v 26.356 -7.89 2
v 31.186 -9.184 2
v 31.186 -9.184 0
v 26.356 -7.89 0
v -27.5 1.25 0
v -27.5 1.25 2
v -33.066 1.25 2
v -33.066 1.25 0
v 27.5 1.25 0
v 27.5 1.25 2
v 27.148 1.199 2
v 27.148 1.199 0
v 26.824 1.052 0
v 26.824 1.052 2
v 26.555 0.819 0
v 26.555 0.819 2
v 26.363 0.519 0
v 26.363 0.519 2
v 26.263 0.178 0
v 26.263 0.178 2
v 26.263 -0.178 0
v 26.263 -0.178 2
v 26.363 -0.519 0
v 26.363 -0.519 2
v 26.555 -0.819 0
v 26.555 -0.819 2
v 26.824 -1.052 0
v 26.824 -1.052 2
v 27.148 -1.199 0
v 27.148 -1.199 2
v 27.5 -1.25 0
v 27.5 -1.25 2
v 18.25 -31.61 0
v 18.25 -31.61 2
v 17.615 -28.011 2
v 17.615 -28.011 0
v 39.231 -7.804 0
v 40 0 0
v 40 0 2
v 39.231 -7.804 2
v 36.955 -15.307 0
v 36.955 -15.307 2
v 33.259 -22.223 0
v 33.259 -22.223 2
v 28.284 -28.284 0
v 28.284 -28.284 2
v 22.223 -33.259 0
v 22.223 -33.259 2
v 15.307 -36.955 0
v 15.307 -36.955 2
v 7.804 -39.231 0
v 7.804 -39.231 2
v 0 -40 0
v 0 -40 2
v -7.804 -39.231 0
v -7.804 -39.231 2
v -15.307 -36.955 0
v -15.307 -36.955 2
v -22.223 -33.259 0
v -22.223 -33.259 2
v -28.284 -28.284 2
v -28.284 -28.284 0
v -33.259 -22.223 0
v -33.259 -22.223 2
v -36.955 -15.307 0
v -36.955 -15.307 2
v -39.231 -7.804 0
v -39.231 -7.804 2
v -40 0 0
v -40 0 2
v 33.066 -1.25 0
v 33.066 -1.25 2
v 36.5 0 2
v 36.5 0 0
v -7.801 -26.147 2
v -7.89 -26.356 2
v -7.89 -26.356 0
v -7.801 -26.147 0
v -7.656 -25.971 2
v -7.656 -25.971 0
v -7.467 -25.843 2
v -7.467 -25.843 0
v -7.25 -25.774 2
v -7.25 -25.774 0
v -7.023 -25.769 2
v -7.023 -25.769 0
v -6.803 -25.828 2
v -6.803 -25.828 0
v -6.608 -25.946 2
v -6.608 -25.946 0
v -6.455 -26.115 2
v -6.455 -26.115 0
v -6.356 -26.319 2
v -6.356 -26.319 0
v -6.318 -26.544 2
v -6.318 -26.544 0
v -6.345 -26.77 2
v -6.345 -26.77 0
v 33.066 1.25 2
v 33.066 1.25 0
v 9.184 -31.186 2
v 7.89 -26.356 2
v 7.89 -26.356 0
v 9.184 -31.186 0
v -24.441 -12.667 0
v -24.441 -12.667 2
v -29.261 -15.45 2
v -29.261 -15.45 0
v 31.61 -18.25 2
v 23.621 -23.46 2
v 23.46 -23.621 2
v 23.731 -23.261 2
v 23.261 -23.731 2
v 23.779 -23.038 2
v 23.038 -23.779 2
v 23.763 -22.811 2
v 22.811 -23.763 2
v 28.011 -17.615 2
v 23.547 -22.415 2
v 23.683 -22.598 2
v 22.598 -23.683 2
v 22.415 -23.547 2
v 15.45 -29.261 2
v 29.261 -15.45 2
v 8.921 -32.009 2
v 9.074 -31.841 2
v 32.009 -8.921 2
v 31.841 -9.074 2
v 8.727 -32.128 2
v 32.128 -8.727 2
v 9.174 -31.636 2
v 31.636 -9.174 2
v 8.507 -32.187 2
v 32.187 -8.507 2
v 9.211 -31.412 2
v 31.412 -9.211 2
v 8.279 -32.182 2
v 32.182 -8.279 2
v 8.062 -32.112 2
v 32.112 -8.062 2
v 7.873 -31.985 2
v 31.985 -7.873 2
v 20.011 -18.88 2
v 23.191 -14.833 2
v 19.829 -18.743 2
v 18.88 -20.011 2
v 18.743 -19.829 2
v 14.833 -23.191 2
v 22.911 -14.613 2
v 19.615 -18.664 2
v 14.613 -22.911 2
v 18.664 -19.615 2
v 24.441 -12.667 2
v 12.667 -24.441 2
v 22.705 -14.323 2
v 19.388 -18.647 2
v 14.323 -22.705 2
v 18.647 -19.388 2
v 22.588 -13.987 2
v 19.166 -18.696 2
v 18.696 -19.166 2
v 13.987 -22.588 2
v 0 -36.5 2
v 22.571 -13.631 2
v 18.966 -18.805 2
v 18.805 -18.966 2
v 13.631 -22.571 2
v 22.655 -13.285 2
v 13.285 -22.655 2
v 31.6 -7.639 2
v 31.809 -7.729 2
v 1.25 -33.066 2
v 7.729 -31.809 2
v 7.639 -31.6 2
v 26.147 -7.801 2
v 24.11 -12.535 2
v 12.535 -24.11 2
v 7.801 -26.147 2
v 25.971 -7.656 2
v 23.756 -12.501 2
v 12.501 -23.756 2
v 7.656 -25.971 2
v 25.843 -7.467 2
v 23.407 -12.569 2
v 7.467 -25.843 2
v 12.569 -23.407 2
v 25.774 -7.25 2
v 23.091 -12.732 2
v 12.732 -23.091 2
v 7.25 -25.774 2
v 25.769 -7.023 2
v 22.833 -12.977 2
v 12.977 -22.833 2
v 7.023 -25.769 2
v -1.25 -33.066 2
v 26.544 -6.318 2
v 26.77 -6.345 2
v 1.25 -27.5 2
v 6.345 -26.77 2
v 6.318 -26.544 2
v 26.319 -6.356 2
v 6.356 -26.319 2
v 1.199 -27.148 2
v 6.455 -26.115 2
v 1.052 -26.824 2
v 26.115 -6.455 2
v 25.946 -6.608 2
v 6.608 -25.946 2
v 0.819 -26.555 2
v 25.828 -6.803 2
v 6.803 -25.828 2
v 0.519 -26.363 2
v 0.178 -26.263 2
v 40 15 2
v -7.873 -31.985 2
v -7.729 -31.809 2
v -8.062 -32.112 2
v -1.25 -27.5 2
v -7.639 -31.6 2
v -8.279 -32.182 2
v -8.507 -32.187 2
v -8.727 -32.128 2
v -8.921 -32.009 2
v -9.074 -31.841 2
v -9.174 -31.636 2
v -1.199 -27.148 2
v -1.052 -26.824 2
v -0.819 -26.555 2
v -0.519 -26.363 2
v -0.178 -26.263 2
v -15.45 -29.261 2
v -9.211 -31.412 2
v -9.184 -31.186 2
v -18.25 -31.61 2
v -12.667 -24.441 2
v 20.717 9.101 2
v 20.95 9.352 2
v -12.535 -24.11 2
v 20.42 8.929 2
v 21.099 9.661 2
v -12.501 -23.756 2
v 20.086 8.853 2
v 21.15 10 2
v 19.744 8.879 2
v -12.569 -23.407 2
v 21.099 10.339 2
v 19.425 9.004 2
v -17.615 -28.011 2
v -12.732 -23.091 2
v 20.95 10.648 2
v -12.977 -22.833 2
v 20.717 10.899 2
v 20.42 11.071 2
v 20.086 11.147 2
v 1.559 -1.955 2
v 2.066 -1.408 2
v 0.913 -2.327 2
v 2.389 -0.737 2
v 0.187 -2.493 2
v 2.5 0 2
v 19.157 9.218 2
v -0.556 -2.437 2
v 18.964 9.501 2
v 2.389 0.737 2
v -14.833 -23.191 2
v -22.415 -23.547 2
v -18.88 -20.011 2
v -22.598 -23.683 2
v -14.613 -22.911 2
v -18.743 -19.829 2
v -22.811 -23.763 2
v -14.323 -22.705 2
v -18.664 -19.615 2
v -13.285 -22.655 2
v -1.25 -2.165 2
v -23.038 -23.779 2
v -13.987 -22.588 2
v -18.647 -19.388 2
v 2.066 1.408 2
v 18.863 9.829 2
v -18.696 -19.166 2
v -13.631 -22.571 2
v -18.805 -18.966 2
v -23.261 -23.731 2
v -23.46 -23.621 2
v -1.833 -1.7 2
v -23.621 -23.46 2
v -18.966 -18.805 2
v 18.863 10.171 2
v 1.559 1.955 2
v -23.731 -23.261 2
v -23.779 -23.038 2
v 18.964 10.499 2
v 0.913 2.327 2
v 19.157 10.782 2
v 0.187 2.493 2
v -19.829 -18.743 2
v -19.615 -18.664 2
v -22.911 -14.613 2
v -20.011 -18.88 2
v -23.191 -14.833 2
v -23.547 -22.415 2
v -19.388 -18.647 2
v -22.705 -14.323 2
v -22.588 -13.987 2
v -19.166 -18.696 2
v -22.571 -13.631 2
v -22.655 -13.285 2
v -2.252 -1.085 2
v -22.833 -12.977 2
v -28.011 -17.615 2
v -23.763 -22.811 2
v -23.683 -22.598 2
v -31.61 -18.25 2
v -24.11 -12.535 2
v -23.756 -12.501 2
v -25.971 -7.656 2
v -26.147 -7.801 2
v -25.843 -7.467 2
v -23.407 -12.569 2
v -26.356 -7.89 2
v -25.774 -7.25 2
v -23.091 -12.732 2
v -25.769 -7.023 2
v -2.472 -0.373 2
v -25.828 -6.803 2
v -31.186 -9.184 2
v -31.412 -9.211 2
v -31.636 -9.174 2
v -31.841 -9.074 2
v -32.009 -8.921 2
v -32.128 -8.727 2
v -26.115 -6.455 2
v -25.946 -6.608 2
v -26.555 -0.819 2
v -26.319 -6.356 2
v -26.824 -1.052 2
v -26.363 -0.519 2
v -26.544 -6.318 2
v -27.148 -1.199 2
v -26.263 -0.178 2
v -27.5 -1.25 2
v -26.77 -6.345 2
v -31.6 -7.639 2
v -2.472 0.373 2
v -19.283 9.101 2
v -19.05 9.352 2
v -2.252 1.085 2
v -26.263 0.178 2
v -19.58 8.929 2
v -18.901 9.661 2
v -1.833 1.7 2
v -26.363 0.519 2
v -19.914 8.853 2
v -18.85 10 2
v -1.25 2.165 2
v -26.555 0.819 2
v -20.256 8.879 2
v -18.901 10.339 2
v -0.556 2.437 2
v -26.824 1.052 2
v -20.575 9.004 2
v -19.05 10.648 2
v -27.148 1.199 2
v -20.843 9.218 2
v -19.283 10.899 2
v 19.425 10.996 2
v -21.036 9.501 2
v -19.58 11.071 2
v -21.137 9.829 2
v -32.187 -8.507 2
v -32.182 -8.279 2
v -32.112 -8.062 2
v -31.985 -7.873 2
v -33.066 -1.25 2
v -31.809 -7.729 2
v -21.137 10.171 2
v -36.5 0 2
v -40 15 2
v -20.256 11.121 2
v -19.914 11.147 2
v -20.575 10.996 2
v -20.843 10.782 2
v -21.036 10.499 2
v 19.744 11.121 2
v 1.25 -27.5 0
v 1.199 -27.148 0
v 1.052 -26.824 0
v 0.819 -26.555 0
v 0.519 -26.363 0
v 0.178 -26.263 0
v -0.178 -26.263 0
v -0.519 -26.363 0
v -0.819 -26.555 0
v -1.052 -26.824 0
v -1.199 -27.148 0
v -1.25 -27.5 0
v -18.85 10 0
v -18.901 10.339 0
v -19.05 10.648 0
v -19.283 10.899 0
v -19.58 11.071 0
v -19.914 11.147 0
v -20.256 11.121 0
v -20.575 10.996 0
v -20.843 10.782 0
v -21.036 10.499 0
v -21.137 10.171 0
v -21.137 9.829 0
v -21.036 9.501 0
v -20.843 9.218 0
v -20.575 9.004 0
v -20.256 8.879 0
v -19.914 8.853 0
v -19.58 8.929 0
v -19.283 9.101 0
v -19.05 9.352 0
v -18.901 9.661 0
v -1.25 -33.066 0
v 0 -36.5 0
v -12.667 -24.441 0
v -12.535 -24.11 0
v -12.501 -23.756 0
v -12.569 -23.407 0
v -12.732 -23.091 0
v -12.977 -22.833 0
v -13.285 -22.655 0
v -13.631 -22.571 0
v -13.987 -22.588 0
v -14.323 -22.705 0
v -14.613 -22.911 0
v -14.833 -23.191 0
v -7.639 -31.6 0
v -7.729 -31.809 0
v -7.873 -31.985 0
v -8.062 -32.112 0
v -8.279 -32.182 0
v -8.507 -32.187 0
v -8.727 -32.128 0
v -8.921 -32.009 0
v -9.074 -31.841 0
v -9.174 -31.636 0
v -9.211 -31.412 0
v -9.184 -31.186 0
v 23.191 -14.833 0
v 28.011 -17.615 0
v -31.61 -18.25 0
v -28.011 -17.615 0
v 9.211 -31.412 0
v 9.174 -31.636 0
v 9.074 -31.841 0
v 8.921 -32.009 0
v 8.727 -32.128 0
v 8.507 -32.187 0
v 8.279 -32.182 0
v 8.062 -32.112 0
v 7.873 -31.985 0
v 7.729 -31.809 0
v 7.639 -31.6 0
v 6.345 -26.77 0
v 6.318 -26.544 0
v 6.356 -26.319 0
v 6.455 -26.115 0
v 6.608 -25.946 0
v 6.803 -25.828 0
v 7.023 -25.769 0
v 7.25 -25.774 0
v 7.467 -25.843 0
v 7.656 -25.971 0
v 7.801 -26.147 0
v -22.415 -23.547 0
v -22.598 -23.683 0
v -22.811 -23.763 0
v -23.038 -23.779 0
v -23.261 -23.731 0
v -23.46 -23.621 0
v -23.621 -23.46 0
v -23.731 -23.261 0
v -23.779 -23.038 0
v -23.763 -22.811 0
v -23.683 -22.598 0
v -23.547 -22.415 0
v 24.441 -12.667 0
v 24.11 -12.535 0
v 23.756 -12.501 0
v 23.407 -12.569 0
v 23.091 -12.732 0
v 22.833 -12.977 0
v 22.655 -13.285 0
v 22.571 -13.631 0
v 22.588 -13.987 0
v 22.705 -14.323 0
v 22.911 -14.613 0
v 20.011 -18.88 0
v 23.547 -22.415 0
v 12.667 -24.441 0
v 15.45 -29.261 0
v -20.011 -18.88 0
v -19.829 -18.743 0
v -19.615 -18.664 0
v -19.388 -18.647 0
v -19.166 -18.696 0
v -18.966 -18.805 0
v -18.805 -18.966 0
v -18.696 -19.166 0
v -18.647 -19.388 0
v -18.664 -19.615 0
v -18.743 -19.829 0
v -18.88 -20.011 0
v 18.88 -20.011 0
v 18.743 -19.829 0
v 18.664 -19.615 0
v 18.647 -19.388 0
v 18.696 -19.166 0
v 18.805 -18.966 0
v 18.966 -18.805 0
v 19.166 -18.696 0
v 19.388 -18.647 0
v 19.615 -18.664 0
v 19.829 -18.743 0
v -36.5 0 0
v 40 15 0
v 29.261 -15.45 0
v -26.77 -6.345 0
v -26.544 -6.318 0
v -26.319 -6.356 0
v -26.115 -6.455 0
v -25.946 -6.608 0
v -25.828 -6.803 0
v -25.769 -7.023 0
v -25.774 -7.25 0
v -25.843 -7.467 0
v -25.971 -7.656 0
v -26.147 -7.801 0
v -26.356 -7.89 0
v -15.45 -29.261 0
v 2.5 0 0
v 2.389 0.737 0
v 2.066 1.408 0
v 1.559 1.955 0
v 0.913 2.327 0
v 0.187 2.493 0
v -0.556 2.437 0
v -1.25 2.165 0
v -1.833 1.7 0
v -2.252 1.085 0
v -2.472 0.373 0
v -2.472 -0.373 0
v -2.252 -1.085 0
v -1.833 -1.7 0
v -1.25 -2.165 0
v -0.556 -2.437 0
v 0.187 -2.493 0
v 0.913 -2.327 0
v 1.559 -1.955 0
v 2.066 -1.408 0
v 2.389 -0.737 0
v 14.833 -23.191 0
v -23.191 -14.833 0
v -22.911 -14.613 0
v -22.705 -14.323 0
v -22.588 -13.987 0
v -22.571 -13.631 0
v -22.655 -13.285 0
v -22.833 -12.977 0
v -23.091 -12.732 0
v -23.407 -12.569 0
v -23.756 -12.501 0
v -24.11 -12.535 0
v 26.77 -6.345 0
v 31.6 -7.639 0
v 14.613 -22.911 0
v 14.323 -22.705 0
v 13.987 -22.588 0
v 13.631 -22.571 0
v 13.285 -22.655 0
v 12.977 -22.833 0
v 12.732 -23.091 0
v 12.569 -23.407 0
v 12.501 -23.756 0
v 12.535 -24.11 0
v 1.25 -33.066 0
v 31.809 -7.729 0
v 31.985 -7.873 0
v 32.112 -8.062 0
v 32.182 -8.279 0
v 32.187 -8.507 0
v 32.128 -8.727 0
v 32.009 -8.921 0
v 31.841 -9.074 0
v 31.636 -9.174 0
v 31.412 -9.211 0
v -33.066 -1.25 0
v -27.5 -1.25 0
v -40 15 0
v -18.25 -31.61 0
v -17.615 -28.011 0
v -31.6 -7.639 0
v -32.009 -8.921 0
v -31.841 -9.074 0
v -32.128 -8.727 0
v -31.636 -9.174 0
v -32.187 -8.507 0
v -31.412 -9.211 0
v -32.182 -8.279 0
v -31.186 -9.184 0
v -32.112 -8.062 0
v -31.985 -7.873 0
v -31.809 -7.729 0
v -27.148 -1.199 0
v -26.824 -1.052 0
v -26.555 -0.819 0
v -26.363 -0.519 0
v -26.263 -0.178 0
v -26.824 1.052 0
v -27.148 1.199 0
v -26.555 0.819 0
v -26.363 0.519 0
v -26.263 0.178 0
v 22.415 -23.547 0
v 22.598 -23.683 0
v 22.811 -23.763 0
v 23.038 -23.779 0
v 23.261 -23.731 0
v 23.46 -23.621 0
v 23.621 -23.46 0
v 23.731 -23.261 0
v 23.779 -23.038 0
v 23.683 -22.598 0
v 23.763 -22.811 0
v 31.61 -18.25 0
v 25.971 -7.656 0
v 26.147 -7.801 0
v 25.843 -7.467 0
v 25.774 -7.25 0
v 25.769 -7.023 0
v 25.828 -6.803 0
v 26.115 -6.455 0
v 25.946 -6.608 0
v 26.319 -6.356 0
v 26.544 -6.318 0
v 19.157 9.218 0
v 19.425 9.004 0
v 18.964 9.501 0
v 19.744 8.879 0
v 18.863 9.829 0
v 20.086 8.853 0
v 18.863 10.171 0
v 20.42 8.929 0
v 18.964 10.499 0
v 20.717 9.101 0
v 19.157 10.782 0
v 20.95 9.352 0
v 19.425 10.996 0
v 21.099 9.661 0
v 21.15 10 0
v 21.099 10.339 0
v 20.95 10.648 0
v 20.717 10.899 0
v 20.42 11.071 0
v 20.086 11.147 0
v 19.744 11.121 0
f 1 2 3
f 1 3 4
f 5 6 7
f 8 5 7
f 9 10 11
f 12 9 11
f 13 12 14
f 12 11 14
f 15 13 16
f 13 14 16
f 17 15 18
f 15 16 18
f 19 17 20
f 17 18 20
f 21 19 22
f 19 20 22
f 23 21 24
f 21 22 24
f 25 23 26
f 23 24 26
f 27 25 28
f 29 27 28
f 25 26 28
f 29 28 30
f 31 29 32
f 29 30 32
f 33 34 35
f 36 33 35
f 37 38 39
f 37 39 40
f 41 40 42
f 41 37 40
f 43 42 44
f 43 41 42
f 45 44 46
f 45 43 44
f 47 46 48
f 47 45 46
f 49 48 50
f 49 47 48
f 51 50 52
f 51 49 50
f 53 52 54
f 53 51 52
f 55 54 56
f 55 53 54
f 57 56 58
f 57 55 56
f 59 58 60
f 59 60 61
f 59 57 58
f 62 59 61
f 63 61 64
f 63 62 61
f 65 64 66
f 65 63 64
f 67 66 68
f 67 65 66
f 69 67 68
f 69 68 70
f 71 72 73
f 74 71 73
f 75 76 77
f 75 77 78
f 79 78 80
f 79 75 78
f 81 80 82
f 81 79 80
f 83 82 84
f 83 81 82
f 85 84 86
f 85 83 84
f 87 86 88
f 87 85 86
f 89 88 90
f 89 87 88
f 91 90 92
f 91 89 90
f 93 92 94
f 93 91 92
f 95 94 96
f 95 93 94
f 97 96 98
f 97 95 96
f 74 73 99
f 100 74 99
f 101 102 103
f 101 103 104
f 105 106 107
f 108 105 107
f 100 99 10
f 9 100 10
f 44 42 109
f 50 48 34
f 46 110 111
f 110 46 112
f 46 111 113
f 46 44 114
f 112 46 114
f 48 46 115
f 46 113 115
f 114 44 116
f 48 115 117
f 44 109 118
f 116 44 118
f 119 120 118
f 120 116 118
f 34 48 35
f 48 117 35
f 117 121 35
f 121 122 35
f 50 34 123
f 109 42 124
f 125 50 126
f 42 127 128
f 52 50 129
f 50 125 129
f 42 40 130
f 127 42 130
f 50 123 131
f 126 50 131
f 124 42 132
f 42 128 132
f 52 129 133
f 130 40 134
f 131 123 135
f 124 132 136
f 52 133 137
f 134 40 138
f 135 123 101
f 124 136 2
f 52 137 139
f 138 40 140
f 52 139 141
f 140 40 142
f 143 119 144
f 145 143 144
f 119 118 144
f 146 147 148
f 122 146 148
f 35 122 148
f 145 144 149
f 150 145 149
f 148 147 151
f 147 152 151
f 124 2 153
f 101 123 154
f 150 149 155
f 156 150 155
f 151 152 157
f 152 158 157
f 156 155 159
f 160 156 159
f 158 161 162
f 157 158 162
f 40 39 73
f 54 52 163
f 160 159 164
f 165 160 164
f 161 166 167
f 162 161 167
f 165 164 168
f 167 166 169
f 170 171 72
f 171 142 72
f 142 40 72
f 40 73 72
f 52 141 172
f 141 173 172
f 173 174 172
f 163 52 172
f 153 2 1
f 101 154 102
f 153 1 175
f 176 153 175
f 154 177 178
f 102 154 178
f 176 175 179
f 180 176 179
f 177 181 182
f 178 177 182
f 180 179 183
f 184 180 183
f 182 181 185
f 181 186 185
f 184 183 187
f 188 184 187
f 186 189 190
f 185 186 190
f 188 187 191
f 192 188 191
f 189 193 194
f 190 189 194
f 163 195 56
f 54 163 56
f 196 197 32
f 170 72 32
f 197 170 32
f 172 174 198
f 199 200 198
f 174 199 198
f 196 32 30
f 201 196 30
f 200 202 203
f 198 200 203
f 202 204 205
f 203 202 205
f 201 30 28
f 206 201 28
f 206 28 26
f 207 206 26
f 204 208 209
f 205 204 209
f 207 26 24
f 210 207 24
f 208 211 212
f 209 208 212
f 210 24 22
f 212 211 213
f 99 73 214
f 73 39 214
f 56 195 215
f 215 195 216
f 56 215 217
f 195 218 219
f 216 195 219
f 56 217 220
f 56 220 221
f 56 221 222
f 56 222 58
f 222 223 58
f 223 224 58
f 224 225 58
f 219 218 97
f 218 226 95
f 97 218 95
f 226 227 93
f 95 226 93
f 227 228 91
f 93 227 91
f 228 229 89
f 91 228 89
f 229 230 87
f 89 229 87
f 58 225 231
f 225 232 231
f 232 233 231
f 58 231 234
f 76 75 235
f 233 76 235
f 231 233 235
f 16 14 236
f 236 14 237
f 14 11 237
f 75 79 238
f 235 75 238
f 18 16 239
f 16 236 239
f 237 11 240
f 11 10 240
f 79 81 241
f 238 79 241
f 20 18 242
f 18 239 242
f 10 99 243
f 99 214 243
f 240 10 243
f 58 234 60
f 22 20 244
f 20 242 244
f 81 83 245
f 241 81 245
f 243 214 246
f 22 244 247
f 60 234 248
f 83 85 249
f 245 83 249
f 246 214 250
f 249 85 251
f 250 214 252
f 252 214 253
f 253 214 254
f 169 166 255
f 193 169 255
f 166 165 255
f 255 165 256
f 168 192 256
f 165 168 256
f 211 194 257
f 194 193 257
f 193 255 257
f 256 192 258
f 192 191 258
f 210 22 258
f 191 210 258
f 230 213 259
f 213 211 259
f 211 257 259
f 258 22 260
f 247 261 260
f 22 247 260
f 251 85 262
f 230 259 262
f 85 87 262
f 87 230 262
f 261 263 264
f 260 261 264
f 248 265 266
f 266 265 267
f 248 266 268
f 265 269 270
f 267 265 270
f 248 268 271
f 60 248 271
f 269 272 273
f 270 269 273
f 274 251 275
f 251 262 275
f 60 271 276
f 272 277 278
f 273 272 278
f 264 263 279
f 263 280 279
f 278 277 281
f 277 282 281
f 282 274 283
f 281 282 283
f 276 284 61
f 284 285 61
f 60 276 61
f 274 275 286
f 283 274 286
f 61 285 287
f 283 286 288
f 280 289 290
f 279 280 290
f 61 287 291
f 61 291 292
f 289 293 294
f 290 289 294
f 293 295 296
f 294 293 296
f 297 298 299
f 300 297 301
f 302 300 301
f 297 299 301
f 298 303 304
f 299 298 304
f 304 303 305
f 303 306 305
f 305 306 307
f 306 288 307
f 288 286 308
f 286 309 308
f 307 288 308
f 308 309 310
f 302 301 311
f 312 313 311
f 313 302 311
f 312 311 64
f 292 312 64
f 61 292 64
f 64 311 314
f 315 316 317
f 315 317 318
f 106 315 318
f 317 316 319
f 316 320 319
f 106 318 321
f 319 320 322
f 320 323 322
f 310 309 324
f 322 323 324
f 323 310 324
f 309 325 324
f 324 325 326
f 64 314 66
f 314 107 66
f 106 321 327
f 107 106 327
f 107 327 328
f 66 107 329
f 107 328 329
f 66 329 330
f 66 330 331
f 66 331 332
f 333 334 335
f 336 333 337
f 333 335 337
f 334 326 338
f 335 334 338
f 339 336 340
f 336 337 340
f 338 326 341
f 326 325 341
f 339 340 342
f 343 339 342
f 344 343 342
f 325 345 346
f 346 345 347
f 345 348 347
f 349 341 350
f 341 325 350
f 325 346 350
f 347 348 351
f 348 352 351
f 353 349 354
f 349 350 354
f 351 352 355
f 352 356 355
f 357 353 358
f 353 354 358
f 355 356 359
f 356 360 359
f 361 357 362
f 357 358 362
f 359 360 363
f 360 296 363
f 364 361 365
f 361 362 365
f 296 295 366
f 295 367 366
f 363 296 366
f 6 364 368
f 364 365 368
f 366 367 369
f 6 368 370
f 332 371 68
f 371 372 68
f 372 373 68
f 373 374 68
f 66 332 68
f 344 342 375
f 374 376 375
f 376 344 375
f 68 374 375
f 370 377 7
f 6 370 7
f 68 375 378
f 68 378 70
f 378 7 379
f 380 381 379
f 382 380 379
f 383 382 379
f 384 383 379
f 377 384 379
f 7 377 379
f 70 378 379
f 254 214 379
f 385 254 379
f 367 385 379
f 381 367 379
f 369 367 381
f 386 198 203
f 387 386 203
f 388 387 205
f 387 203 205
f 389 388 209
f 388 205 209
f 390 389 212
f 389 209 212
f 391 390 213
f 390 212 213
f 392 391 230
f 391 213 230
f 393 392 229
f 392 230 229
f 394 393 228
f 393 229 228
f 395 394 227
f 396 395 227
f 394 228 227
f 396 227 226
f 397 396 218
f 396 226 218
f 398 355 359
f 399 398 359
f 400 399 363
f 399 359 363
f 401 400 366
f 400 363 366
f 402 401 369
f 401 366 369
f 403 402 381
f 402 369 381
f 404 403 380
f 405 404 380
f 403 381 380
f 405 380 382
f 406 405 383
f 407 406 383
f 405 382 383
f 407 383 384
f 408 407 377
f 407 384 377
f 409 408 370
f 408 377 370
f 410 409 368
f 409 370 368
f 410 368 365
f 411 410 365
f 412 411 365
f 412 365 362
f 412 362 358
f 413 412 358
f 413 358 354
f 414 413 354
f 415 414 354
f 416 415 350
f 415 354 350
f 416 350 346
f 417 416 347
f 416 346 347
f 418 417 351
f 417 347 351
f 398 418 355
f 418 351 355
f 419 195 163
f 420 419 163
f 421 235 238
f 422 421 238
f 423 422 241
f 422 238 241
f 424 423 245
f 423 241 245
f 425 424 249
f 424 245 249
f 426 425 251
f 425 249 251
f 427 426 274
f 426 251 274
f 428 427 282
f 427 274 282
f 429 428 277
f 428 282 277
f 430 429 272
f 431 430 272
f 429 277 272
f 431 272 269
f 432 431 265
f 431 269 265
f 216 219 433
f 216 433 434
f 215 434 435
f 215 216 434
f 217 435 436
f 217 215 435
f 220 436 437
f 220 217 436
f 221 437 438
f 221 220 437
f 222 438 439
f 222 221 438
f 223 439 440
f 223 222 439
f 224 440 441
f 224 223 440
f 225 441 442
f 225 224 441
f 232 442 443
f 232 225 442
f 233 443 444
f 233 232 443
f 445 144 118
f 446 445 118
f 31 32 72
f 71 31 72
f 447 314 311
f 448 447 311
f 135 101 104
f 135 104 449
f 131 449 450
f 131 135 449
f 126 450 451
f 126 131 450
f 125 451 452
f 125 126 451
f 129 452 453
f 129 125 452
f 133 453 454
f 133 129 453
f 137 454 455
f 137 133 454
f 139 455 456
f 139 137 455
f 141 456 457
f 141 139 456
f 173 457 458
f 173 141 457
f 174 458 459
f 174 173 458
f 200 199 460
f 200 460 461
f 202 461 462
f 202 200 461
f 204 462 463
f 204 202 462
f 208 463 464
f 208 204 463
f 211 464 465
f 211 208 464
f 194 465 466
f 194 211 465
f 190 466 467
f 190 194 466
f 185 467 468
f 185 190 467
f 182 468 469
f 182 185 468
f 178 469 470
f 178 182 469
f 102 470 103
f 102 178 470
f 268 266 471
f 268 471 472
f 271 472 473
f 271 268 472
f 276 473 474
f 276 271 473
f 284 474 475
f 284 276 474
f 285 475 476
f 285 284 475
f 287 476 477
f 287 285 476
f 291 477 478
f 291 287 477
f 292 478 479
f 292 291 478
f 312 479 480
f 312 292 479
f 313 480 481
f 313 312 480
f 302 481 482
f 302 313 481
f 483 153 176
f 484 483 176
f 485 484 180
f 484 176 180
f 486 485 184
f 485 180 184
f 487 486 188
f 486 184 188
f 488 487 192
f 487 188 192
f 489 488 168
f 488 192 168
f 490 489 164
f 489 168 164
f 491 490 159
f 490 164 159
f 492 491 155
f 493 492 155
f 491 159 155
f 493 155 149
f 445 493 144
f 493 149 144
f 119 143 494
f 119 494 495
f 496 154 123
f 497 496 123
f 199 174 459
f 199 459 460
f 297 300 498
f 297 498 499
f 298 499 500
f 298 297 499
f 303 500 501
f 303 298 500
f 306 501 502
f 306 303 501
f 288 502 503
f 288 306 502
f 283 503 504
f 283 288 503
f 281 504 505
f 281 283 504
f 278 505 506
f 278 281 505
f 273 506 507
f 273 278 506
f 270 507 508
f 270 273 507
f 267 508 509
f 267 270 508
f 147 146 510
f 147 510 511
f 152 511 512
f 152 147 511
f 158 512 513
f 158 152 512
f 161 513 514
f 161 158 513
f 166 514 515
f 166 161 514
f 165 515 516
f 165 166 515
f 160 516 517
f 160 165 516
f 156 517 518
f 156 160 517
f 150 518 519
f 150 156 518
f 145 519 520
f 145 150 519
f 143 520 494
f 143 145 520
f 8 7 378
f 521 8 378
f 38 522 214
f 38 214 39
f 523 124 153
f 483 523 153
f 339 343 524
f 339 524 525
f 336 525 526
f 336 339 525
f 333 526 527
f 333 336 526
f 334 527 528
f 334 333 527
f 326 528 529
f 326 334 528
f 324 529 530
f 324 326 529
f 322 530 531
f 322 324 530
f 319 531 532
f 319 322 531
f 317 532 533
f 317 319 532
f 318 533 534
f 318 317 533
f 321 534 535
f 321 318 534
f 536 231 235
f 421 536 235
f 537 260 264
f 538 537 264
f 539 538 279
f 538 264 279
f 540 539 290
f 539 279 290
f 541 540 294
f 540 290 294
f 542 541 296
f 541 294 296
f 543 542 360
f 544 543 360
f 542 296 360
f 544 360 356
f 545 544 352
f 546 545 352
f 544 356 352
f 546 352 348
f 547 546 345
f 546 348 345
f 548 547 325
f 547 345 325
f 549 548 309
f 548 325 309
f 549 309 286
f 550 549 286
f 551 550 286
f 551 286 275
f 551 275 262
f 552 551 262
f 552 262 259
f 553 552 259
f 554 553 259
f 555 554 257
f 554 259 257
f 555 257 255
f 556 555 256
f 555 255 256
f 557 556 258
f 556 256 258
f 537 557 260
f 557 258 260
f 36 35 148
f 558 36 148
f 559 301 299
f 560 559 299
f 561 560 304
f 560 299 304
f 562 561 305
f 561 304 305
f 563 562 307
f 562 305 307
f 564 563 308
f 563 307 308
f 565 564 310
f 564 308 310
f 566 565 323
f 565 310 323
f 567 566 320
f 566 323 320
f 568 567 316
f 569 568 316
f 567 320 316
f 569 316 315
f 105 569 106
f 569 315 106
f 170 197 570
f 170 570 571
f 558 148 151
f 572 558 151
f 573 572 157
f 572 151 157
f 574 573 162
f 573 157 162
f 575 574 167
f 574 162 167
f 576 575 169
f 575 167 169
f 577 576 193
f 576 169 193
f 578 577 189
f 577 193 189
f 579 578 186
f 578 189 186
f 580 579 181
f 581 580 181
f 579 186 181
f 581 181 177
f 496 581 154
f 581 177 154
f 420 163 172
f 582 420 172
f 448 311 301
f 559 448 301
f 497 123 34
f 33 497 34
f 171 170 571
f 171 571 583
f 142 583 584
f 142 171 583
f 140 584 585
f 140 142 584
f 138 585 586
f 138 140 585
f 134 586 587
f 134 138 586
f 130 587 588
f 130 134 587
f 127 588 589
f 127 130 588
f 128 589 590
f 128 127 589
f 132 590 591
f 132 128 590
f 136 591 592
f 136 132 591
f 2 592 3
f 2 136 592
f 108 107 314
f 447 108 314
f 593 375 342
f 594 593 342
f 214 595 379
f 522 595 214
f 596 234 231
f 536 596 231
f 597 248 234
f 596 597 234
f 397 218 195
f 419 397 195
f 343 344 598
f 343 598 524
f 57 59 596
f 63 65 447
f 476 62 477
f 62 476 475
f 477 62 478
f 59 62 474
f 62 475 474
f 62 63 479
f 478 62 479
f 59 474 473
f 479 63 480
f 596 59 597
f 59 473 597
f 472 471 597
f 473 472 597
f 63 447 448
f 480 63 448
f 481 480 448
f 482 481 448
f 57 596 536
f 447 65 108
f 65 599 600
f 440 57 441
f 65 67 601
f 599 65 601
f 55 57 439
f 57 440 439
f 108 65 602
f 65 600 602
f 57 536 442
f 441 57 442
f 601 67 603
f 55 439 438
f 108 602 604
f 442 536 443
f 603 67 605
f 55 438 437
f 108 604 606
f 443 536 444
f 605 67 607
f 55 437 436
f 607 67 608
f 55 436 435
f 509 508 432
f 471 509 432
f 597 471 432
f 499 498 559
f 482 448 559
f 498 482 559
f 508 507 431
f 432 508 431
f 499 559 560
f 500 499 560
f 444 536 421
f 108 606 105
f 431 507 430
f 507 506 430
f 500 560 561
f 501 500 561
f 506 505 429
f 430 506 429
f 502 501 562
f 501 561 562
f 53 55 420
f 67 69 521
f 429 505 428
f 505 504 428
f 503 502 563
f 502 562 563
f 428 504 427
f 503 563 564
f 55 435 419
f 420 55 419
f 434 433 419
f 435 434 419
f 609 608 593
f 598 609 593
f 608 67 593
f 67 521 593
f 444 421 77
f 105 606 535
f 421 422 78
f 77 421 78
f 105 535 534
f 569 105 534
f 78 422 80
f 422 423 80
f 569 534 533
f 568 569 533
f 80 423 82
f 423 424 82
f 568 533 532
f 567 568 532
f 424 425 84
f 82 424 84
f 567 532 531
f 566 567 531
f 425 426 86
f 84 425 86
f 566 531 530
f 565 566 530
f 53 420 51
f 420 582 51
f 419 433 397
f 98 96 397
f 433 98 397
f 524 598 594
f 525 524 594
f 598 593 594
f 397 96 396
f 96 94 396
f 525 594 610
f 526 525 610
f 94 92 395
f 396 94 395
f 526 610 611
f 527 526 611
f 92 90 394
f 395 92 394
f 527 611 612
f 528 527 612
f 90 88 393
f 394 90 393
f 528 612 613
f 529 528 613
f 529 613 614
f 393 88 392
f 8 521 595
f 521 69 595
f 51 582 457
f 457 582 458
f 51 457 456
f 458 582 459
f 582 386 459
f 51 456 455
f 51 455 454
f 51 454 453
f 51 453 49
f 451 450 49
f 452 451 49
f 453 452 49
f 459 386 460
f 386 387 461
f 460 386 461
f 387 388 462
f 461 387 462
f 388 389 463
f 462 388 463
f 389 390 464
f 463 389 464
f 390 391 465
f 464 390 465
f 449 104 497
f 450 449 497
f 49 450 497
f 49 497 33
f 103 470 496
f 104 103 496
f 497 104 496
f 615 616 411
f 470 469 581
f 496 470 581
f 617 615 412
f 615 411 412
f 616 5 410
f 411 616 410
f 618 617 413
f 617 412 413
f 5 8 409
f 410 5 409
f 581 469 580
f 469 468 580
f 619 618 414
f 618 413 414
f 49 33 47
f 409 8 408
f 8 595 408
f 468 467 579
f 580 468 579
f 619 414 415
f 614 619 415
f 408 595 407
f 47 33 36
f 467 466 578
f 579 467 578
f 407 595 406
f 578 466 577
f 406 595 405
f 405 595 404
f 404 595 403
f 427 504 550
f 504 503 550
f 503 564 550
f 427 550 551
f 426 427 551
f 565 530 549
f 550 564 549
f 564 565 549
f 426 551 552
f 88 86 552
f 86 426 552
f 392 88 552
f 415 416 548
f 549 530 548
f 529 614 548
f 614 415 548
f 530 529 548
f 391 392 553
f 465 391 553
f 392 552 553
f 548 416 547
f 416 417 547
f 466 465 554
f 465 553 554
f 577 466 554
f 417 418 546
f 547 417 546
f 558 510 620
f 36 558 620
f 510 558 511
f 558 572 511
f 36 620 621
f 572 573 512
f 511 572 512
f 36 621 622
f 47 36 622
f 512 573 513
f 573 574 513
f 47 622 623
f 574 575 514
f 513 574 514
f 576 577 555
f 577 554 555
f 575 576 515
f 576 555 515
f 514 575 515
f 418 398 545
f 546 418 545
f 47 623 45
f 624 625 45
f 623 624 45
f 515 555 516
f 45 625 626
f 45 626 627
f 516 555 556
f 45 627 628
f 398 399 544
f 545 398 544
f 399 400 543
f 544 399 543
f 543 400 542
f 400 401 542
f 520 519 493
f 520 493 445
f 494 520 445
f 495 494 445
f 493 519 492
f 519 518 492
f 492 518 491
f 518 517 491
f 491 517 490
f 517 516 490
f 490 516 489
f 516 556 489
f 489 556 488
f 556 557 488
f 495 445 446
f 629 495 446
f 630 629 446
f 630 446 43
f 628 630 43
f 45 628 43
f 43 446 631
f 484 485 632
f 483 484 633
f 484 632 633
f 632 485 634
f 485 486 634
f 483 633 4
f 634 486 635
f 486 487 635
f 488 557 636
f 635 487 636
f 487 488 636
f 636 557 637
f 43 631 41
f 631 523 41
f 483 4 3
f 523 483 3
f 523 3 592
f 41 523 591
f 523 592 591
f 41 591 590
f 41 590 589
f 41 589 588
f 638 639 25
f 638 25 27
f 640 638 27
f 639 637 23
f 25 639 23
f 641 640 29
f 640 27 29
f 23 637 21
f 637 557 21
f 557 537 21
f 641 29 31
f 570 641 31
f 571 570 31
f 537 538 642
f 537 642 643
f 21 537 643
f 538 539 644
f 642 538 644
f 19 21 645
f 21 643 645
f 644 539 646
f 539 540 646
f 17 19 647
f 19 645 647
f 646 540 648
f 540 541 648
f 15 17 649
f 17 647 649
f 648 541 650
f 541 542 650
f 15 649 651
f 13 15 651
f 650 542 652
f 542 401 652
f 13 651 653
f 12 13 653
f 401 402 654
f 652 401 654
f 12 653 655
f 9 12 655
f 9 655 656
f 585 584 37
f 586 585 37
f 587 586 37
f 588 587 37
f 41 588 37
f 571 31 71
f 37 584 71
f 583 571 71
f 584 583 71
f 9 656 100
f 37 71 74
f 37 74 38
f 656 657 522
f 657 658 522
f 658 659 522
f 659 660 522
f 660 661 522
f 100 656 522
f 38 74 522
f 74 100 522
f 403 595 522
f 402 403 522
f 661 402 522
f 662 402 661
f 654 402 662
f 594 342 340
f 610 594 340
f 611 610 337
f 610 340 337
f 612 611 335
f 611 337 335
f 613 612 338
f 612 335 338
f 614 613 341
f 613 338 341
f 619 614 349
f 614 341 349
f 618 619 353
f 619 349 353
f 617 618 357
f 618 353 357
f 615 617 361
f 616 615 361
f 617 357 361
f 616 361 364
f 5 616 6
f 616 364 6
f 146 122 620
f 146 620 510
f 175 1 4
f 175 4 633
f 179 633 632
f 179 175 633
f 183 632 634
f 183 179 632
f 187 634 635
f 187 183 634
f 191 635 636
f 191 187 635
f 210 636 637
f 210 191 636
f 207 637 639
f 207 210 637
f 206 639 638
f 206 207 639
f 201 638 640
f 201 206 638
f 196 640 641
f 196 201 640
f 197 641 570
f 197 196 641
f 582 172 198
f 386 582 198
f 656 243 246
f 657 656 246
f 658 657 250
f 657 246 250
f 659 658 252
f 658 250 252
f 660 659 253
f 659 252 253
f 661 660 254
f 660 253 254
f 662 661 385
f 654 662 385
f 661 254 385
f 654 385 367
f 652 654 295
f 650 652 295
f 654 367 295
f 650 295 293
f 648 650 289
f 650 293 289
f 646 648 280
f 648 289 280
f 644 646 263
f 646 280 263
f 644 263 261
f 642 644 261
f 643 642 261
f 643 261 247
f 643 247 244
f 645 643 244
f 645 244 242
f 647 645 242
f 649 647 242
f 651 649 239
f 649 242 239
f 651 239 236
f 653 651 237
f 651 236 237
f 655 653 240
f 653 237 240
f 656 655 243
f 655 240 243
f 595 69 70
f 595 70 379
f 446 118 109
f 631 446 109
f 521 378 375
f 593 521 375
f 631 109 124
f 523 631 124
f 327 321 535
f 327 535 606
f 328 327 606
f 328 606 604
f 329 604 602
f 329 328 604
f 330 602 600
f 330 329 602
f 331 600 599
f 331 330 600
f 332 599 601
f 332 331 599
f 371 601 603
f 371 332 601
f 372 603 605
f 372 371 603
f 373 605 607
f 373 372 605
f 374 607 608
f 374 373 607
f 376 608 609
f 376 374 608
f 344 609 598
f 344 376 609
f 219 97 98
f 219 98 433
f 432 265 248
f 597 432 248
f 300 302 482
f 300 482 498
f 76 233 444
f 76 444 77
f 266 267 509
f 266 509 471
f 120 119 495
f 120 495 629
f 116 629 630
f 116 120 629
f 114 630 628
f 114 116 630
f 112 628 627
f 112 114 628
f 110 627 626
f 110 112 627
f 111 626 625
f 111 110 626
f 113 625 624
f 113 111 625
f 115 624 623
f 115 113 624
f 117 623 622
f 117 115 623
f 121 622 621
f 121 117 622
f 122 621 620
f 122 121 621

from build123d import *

# Parameters (mm, degrees)
BOSS_EXTRUDE1_DEPTH = 2
CUT_EXTRUDE2_DEPTH  = 2
CIRPATTERN1_COUNT   = 7
CIRPATTERN1_ANGLE   = 180
CUT_EXTRUDE3_DEPTH  = 2
CIRPATTERN2_COUNT   = 6
CIRPATTERN2_ANGLE   = 150
SKETCH5_R           = 2.5
CUT_EXTRUDE4_DEPTH  = 2
SKETCH6_R           = 1.15
CUT_EXTRUDE5_DEPTH  = 2


with BuildPart() as part:
    # Sketch1 → Boss-Extrude1 (new body)
    # profile 1 of 2: a face of its own
    with BuildSketch(Plane.XY):
        with BuildLine():
            ThreePointArc((40, 0), (0, -40), (-40, 0))
            Line((-40, 0), (-40, 15))
            Line((-40, 15), (40, 15))
            Line((40, 15), (40, 0))
        make_face()
        with BuildLine():
            ThreePointArc((-27.5, -1.25), (-26.25, 0), (-27.5, 1.25))
            Line((-27.5, 1.25), (-33.065653226, 1.25))
            Line((-33.065653226, 1.25), (-36.5, 0))
            Line((-36.5, 0), (-33.065653226, -1.25))
            Line((-33.065653226, -1.25), (-27.5, -1.25))
        make_face(mode=Mode.SUBTRACT)
    # profile 2 of 2: a face of its own
    with BuildSketch(Plane.XY):
        with BuildLine():
            Line((-33.065653226, -1.25), (-27.5, -1.25))
            ThreePointArc((-27.5, -1.25), (-26.25, 0), (-27.5, 1.25))
            Line((-27.5, 1.25), (-33.065653226, 1.25))
            Line((-33.065653226, 1.25), (-36.5, 0))
            Line((-36.5, 0), (-33.065653226, -1.25))
        make_face()
    extrude(amount=BOSS_EXTRUDE1_DEPTH)

    # Sketch2 → Cut-Extrude2 (cut)
    with BuildSketch(Plane.XY.offset(2)):
        with BuildLine():
            Line((-33.065653226, -1.25), (-27.5, -1.25))
            ThreePointArc((-27.5, -1.25), (-26.25, 0), (-27.5, 1.25))
            Line((-27.5, 1.25), (-33.065653226, 1.25))
            Line((-33.065653226, 1.25), (-36.5, 0))
            Line((-36.5, 0), (-33.065653226, -1.25))
        make_face()
    cut_extrude2 = extrude(amount=-CUT_EXTRUDE2_DEPTH, mode=Mode.SUBTRACT)

    # CirPattern1: Cut-Extrude2 ×7 about axis
    cirpattern1_axis = Axis((0, 0, 0), (0, 0, 1))
    for i in range(1, CIRPATTERN1_COUNT):
        add(cut_extrude2.rotate(cirpattern1_axis, i * CIRPATTERN1_ANGLE / (CIRPATTERN1_COUNT - 1)), mode=Mode.SUBTRACT)

    # Sketch4 → Cut-Extrude3 (cut)
    with BuildSketch(Plane.XY.offset(2)):
        with BuildLine():
            Line((-26.355904987, -7.890264401), (-31.185534118, -9.184359627))
            ThreePointArc((-31.185534118, -9.184359627), (-32.165330015, -8.618674202), (-31.59964459, -7.638878305))
            Line((-31.59964459, -7.638878305), (-26.770015459, -6.344783079))
            ThreePointArc((-26.770015459, -6.344783079), (-25.790219562, -6.910468504), (-26.355904987, -7.890264401))
        make_face()
    cut_extrude3 = extrude(amount=-CUT_EXTRUDE3_DEPTH, mode=Mode.SUBTRACT)

    # CirPattern2: Cut-Extrude3 ×6 about axis
    cirpattern2_axis = Axis((0, 0, 0), (0, 0, 1))
    for i in range(1, CIRPATTERN2_COUNT):
        add(cut_extrude3.rotate(cirpattern2_axis, i * CIRPATTERN2_ANGLE / (CIRPATTERN2_COUNT - 1)), mode=Mode.SUBTRACT)

    # Sketch5 → Cut-Extrude4 (cut)
    with BuildSketch(Plane.XY.offset(2)):
        Circle(SKETCH5_R)
    extrude(amount=-CUT_EXTRUDE4_DEPTH, mode=Mode.SUBTRACT)

    # Sketch6 → Cut-Extrude5 (cut)
    with BuildSketch(Plane.XY.offset(2)):
        with Locations((-20, 10)):
            Circle(SKETCH6_R)
        with Locations((20, 10)):
            Circle(SKETCH6_R)
    extrude(amount=-CUT_EXTRUDE5_DEPTH, mode=Mode.SUBTRACT)


solid = part.part
